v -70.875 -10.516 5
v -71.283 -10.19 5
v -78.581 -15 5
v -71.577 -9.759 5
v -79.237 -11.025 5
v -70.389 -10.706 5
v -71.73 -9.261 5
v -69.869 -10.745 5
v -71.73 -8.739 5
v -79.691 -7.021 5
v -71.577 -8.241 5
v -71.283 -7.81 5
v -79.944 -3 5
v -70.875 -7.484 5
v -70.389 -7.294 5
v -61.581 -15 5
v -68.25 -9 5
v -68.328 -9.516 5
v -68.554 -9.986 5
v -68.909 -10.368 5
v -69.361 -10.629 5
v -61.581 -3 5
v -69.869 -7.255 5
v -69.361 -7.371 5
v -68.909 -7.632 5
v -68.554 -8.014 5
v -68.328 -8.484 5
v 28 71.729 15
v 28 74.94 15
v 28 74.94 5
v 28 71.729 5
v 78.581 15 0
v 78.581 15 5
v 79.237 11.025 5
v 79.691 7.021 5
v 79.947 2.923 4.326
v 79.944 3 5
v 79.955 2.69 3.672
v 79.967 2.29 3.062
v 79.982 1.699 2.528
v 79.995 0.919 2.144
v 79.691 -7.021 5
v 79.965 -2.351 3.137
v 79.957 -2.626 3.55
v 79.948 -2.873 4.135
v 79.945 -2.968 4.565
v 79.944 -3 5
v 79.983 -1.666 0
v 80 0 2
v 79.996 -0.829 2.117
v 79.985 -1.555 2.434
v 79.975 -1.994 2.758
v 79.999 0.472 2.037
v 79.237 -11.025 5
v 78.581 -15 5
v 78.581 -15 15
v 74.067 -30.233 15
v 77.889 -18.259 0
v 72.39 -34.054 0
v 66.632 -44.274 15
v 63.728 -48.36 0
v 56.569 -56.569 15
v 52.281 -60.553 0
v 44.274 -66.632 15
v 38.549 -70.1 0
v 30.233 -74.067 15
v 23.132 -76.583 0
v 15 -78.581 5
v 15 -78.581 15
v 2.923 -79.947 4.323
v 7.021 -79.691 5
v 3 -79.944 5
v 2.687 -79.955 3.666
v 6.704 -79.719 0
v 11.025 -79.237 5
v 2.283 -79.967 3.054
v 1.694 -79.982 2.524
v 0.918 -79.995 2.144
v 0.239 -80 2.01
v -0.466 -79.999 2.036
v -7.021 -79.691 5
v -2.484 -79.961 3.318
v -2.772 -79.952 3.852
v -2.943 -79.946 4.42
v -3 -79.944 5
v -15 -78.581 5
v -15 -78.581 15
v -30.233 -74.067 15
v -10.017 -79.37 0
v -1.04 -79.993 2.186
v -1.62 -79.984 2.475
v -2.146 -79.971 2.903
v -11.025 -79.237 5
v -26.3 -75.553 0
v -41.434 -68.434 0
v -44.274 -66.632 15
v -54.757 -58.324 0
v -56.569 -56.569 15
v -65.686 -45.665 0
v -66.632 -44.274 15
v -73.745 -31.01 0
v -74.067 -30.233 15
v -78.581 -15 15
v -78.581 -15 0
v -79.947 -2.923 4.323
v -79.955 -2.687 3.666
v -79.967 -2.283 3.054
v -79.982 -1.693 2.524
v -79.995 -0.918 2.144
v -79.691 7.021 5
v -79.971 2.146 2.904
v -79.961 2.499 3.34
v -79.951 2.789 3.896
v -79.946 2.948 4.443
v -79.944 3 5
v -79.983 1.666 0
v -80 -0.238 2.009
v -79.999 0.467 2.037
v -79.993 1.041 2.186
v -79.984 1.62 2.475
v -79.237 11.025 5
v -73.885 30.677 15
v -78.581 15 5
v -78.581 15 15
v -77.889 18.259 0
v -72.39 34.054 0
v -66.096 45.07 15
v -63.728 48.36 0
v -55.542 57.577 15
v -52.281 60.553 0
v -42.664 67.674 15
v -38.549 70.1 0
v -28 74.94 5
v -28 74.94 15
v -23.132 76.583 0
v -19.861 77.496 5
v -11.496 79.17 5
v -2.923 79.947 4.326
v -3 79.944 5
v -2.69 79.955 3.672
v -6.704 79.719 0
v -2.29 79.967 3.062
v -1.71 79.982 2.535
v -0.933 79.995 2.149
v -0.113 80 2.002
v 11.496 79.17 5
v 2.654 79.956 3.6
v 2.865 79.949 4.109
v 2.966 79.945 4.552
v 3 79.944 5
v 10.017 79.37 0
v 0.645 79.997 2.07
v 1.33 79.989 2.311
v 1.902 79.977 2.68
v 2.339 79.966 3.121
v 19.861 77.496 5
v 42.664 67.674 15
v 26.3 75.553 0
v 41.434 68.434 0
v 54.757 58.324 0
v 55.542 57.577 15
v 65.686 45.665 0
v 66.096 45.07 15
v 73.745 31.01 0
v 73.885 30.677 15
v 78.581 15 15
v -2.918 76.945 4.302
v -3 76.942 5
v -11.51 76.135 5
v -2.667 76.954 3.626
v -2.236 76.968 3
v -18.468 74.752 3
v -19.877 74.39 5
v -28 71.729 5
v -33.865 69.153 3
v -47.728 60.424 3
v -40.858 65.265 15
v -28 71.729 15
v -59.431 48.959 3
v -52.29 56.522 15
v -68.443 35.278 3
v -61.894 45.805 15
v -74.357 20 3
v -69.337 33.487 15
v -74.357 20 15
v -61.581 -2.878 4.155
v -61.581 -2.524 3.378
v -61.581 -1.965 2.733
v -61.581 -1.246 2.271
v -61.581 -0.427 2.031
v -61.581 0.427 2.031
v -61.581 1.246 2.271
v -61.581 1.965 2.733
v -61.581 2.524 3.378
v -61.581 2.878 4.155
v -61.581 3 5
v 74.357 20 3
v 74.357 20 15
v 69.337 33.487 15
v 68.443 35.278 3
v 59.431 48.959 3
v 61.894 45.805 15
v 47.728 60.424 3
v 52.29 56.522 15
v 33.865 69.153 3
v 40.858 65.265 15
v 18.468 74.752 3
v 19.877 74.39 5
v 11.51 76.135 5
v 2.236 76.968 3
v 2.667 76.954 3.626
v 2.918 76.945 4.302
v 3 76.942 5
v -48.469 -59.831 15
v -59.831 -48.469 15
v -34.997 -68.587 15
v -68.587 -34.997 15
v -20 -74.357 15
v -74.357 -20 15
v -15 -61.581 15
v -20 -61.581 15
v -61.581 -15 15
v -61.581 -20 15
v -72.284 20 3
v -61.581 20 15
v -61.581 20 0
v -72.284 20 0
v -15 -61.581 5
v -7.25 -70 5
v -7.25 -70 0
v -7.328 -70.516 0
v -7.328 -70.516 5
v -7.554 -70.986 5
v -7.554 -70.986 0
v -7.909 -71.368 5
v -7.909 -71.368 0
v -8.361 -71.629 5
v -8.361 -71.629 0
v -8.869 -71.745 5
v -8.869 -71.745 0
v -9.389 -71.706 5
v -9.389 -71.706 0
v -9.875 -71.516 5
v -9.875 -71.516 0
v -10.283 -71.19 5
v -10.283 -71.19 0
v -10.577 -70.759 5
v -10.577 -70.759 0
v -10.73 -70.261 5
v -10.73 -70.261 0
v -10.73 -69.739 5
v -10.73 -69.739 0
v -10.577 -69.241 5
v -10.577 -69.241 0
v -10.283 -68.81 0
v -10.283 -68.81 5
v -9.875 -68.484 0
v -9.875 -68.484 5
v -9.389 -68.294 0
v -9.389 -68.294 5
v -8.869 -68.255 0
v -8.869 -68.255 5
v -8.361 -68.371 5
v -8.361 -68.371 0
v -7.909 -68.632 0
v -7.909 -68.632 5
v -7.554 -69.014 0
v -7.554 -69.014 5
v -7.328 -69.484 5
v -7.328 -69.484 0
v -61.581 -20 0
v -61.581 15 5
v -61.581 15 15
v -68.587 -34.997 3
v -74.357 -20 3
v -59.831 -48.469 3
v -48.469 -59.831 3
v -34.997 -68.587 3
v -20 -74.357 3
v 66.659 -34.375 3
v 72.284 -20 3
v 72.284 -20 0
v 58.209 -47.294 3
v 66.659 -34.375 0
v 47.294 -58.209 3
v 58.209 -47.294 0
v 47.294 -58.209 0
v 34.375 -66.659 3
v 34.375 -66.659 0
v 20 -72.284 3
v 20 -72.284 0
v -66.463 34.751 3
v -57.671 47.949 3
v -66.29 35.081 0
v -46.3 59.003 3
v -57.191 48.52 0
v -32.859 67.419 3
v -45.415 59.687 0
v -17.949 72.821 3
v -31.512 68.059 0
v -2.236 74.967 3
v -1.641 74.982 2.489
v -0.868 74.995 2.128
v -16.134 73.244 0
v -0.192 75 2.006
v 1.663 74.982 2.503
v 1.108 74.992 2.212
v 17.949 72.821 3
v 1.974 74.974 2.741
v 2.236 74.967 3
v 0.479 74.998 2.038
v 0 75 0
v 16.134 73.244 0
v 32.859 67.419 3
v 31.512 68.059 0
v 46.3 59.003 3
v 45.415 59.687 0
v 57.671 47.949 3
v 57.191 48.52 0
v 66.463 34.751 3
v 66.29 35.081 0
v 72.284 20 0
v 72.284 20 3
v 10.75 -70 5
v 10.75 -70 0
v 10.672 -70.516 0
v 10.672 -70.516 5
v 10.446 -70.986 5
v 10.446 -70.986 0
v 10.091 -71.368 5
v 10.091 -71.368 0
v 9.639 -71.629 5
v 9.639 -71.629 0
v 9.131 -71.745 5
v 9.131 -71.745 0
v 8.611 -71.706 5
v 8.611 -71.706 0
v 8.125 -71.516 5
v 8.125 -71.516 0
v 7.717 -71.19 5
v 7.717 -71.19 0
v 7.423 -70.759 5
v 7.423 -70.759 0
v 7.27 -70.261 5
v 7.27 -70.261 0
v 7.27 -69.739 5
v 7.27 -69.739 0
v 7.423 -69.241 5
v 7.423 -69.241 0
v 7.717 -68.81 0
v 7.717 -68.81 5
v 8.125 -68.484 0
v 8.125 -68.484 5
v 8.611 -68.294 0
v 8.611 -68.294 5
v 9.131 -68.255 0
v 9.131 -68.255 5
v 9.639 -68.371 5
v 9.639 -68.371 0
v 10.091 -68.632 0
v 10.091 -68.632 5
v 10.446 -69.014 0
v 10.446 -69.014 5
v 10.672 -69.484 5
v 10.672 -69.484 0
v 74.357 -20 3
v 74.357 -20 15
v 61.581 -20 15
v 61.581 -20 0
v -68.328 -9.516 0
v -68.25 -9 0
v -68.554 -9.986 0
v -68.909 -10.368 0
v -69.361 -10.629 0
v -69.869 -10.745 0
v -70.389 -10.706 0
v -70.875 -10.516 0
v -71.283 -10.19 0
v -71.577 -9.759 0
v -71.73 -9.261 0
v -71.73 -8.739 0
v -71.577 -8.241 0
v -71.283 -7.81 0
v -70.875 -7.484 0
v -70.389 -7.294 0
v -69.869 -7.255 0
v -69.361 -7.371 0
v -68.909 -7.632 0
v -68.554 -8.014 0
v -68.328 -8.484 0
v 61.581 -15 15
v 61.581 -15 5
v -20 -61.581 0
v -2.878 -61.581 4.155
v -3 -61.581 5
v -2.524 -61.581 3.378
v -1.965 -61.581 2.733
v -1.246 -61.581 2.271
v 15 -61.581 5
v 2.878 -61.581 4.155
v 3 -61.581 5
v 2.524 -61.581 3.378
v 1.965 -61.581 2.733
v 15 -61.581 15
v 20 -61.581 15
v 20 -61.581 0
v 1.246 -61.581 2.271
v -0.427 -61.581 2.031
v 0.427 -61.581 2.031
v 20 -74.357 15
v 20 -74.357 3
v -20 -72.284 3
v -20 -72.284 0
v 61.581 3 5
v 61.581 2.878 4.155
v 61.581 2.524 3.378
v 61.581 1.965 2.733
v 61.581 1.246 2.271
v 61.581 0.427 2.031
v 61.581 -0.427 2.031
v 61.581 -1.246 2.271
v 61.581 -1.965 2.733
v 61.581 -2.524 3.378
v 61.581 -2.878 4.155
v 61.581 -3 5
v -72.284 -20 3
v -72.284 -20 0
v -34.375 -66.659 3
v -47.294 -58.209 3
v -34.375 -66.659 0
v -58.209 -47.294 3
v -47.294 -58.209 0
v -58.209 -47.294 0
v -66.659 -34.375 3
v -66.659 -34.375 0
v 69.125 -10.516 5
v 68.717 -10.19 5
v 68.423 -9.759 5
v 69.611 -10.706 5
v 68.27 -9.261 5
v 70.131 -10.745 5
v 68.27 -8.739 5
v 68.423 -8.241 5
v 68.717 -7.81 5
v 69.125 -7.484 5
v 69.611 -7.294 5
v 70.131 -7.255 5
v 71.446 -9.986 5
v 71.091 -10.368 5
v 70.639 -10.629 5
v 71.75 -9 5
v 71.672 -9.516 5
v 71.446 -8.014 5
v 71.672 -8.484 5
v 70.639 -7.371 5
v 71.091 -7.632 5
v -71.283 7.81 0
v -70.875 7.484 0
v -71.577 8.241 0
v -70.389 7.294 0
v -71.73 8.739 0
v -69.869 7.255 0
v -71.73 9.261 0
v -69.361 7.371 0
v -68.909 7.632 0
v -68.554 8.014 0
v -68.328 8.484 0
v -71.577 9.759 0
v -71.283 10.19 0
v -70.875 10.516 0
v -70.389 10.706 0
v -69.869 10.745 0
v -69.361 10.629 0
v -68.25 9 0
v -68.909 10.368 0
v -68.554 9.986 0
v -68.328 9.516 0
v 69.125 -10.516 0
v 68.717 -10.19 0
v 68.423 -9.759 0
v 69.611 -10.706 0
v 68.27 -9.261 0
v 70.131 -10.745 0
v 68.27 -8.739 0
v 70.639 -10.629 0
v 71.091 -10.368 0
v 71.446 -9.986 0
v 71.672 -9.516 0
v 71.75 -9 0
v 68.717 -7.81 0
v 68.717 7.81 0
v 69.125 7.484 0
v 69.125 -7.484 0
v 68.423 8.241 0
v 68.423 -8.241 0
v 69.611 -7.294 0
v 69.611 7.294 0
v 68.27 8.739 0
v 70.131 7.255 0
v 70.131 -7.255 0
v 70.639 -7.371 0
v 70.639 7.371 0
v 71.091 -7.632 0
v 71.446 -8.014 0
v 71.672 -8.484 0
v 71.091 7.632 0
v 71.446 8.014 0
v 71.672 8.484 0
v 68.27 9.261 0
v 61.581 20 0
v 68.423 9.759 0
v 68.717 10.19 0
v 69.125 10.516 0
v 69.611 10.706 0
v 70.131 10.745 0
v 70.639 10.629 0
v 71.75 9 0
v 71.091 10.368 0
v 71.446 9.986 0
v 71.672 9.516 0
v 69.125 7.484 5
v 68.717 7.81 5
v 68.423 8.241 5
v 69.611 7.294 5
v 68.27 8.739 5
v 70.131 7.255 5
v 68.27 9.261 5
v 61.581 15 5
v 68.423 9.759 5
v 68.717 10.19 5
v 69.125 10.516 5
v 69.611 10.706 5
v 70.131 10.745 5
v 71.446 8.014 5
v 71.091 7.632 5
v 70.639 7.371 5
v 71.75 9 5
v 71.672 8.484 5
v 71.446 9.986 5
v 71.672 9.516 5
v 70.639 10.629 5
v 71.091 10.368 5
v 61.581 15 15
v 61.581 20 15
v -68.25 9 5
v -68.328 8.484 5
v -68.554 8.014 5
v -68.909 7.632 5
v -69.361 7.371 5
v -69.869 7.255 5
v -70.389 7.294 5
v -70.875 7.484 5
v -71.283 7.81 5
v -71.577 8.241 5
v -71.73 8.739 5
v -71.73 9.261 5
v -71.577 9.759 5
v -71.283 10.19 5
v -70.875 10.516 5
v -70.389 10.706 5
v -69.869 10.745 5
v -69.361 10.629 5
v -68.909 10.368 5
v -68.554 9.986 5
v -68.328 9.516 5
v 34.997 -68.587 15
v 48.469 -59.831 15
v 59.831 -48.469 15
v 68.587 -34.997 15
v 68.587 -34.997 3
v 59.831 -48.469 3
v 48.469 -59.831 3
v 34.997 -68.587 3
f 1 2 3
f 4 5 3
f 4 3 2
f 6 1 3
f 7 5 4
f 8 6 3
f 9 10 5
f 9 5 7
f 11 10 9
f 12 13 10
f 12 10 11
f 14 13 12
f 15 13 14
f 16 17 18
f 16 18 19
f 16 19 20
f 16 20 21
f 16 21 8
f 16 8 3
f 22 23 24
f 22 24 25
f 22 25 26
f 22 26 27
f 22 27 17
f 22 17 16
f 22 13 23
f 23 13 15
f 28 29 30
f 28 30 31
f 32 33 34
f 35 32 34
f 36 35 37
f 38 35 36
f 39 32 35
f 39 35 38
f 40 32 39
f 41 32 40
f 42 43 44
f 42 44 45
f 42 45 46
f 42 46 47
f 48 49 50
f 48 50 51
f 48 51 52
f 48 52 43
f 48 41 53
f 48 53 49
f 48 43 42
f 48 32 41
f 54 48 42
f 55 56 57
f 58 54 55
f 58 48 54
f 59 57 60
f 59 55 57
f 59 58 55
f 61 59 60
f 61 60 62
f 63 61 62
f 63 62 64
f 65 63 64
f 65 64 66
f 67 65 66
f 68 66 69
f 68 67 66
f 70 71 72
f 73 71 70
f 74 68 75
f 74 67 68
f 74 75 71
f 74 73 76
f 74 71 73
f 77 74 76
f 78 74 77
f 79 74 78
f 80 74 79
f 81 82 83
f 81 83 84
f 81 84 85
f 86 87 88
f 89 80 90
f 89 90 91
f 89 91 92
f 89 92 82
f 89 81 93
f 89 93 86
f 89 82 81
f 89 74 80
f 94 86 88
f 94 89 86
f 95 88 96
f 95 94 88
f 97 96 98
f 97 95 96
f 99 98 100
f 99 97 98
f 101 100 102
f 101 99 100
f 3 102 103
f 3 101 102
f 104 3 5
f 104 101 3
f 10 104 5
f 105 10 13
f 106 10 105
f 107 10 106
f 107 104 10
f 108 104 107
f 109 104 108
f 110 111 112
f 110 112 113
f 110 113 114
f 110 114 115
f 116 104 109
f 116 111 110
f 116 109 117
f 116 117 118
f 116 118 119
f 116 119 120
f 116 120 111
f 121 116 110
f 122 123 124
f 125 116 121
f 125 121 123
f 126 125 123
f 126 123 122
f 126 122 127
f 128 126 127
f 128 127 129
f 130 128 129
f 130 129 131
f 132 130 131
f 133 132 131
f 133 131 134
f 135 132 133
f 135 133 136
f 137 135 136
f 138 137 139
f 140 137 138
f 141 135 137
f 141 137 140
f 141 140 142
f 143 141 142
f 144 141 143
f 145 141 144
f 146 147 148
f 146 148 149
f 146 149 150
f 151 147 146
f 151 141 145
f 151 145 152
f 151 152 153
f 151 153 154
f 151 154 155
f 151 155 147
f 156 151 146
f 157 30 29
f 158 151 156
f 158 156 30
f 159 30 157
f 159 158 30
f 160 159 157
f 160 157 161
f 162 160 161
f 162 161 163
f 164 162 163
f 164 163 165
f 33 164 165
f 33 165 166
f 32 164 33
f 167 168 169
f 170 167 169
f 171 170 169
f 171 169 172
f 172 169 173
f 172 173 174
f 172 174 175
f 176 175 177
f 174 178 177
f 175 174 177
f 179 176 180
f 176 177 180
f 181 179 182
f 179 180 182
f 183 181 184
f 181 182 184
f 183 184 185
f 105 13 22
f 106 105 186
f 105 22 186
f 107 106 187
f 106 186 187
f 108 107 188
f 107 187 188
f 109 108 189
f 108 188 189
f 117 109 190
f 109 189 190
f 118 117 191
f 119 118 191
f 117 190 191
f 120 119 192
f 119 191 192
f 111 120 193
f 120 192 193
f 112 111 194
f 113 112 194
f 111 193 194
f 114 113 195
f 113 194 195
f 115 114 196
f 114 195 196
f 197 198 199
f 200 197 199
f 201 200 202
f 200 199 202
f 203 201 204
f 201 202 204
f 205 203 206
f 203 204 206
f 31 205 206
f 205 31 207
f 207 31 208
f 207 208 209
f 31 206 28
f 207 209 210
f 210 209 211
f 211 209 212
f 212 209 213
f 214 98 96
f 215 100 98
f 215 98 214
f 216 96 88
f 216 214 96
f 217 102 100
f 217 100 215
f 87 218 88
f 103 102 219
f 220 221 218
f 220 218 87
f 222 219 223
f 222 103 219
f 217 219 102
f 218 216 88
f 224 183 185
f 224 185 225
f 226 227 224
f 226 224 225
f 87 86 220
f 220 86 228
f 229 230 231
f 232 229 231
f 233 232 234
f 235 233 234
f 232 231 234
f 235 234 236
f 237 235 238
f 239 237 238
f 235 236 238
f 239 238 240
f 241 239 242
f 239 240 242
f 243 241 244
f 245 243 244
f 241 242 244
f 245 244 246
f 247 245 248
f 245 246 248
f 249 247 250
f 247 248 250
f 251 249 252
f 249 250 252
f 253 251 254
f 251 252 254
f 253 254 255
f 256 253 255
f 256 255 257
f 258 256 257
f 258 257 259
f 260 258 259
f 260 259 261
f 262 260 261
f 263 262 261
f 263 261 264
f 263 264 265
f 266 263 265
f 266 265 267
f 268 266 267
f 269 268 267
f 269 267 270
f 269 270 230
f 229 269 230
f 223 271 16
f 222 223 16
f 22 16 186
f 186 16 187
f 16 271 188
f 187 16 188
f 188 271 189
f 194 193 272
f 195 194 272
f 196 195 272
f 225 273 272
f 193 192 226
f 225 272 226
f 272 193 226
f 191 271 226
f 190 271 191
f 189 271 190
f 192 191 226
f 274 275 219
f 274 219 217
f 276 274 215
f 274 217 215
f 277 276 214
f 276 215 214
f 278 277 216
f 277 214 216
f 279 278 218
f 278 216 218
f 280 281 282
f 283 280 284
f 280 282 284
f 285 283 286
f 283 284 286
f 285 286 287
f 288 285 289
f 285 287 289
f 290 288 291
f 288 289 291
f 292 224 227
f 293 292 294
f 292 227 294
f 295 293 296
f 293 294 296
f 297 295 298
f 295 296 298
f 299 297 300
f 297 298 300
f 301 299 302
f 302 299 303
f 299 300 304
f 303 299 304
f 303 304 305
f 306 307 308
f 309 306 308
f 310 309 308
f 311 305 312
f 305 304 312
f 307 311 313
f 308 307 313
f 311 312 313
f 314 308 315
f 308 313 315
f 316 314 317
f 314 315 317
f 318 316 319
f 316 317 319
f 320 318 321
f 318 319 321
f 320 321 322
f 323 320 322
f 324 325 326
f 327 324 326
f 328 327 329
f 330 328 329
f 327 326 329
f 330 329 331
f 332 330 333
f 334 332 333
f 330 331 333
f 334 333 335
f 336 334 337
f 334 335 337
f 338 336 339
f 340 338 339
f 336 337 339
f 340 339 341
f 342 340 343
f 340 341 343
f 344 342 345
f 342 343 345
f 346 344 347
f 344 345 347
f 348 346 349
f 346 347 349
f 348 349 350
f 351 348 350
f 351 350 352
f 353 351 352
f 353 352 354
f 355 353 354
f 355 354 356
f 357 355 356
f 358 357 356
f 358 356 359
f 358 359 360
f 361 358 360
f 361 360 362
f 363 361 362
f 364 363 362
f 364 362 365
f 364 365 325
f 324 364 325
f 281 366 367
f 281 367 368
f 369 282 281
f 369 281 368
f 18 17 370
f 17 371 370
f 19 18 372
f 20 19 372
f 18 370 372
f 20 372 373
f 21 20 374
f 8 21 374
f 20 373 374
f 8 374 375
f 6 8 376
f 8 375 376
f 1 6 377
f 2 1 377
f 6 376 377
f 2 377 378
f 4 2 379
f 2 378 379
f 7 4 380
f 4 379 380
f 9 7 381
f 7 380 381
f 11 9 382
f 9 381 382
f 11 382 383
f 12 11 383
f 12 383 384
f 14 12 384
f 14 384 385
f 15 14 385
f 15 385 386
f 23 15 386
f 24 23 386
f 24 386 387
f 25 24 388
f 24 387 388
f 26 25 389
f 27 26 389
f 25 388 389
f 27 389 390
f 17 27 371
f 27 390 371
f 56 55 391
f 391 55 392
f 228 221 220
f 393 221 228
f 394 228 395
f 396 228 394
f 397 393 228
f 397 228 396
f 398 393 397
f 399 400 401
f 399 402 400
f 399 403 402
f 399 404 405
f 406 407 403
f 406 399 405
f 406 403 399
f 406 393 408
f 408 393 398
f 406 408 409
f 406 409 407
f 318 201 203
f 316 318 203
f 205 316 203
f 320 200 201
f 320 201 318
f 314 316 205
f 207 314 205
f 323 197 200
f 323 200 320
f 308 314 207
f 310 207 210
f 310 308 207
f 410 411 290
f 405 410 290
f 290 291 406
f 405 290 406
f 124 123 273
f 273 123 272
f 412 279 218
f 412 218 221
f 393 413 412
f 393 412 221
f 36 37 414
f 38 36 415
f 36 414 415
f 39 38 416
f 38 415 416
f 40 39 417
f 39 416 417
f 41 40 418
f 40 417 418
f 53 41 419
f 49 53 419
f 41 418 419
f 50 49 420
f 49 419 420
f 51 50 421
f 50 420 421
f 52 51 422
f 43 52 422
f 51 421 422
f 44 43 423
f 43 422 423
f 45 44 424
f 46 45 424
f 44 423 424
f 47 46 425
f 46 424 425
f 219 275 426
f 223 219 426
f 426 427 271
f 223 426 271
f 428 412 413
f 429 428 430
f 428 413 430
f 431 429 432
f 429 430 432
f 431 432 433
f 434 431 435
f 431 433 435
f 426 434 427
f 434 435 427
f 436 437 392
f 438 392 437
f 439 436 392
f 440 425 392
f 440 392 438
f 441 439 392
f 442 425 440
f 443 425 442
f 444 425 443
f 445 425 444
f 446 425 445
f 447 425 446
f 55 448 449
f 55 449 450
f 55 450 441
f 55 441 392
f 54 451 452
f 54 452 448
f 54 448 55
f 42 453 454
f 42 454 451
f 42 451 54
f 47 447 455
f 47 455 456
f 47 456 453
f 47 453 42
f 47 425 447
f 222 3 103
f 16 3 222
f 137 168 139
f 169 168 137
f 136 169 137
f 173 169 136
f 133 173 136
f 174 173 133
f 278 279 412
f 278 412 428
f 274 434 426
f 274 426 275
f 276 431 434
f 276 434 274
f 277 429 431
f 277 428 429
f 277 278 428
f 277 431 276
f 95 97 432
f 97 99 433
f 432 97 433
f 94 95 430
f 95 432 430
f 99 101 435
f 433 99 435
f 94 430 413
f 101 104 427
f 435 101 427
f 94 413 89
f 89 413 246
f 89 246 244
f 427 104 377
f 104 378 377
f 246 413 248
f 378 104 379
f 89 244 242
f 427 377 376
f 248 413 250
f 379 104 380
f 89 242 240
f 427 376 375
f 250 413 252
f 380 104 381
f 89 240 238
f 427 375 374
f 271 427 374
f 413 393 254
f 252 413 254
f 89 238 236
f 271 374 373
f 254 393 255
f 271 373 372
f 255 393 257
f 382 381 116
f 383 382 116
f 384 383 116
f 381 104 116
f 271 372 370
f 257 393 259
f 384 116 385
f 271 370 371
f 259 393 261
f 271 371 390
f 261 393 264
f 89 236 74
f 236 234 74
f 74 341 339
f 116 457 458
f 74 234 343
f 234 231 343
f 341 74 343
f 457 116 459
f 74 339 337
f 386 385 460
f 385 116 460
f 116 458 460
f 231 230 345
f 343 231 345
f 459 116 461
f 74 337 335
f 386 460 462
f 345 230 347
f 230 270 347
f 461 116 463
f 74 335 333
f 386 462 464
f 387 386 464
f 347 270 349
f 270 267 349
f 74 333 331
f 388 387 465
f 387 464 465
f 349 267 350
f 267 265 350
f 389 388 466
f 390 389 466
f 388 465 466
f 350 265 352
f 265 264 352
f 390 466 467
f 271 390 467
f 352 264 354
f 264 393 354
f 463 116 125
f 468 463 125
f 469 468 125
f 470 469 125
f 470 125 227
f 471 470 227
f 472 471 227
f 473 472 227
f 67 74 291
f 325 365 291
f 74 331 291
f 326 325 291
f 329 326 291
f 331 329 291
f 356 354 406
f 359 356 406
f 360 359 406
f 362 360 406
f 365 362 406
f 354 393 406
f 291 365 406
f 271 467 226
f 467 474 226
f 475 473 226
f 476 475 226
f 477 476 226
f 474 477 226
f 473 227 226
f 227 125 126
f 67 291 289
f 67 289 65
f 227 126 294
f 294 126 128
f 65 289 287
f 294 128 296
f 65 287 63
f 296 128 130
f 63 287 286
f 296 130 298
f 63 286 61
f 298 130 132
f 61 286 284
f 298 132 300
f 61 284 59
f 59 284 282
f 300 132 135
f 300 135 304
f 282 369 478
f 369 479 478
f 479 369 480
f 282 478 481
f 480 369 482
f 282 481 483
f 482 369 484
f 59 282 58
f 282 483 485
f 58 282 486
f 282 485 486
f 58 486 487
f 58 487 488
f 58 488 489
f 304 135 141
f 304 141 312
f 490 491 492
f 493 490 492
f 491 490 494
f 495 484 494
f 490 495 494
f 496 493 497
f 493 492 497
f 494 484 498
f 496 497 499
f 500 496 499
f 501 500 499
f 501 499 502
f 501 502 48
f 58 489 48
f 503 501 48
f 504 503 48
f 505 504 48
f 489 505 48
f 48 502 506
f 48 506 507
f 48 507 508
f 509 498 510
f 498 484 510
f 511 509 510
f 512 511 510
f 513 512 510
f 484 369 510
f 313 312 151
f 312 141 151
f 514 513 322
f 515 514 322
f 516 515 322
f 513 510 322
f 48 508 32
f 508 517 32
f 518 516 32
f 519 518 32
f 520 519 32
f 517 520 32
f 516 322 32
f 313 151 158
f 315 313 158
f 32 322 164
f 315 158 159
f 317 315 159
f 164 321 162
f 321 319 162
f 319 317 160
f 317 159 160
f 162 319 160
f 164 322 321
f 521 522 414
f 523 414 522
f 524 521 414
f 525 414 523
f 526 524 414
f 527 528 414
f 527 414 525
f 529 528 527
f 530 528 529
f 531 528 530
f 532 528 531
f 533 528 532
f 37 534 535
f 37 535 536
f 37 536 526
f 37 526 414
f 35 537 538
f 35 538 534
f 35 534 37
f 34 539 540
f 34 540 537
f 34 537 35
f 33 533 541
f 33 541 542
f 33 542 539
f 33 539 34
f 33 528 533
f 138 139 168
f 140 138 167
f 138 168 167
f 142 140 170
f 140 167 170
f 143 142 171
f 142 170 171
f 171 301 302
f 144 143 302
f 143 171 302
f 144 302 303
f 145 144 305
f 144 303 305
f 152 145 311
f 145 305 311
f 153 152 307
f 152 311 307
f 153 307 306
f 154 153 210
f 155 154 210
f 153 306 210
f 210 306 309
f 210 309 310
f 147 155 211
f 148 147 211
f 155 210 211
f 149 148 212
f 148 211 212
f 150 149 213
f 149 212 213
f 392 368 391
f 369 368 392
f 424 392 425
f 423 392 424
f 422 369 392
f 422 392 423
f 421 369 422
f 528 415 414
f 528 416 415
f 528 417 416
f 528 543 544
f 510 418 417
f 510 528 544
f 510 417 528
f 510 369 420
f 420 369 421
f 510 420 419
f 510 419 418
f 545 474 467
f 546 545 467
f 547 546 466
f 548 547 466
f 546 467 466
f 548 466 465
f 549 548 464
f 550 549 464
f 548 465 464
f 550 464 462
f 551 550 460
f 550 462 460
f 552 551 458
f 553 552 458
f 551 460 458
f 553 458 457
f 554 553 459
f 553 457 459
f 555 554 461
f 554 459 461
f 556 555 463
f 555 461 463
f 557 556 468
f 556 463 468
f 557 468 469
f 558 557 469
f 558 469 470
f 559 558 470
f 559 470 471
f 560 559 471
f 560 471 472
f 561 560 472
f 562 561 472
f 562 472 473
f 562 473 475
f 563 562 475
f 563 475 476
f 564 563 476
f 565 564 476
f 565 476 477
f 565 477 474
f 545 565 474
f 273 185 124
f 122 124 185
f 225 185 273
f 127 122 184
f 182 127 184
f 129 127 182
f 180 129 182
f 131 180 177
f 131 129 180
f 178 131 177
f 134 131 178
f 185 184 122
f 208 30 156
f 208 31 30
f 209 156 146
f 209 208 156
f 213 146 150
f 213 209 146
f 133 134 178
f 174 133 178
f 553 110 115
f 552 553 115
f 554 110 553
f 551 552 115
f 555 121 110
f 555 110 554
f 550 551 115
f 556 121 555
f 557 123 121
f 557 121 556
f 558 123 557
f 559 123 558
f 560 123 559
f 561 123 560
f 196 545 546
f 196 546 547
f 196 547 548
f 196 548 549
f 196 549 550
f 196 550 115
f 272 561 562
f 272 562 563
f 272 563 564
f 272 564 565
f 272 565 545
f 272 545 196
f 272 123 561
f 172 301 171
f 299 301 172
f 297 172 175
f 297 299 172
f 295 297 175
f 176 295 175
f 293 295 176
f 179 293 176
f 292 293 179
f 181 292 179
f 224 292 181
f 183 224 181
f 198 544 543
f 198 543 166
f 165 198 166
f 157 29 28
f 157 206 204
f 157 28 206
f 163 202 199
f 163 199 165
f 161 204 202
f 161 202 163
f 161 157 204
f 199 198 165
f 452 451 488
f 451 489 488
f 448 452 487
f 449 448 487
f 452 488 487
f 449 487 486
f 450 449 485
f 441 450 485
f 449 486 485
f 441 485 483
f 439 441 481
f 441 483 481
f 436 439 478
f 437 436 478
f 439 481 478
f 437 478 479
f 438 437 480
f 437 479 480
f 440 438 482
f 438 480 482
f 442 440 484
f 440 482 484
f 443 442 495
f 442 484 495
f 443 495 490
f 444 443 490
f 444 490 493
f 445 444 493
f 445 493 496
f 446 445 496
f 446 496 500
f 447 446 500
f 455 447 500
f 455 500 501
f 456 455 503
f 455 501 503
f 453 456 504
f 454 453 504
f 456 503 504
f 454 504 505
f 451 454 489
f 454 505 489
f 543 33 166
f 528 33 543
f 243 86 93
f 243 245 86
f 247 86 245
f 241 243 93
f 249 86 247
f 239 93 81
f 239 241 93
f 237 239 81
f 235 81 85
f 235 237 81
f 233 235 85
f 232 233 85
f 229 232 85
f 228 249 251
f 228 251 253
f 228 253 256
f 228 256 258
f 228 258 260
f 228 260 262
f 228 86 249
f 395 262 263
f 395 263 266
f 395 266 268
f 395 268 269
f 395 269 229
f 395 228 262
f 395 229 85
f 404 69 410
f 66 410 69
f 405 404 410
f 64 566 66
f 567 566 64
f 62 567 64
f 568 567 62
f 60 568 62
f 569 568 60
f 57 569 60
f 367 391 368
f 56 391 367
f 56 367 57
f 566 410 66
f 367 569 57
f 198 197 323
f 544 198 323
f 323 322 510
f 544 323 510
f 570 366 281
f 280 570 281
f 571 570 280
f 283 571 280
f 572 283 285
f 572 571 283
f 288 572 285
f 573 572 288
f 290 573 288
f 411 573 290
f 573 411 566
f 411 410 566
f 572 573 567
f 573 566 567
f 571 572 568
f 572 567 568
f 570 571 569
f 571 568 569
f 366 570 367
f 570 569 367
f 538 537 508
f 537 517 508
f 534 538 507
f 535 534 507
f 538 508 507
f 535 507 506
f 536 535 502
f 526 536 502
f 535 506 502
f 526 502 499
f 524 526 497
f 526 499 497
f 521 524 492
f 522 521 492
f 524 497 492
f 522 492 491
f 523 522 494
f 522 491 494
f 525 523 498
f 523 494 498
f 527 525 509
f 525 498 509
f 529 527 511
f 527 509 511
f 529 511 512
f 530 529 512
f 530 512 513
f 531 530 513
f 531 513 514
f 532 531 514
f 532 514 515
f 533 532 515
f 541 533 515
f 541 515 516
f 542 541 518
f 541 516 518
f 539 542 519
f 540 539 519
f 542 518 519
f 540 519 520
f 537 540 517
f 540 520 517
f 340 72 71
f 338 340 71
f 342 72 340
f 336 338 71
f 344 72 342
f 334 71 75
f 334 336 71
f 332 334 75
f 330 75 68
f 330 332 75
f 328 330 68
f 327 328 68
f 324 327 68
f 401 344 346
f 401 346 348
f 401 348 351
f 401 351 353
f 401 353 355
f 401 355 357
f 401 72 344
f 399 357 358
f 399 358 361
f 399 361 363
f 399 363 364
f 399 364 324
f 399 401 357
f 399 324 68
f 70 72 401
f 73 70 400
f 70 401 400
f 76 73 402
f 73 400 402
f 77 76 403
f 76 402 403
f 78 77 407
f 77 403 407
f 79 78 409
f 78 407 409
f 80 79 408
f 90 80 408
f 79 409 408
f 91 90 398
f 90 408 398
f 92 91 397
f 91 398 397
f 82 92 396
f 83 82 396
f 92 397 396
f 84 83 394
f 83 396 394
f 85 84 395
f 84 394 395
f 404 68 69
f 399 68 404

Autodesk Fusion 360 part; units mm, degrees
sketch "Sketch1" plane through (0, 0, 0) normal (0, 0, 1) x (1, 0, 0)
  circle A0 centre (0, 0) radius 80
  circle A1 centre (0, 0) radius 75
  line L0 (109.3577, 15) -> (-93.0881, 15) construction
  line L1 (20, 0) -> (2.5, 0)
  line L2 (109.3577, -15) -> (-93.0881, -15) construction
  line L3 (-78.5812, 15) -> (-61.5812, 15)
  line L4 (-78.5812, -15) -> (-61.5812, -15)
  line L5 (-97.5254, 20) -> (90.0497, 20) construction
  line L6 (-97.5254, -20) -> (90.0497, -20) construction
  line L7 (-77.4597, 20) -> (-61.5812, 20)
  line L8 (-77.4597, -20) -> (-61.5812, -20)
  line L9 (-61.5812, -15) -> (-61.5812, -20)
  line L10 (-61.5812, 15) -> (-61.5812, 20)
  line L11 (-20, -77.4597) -> (-20, -61.5812)
  line L12 (-15, -61.5812) -> (-20, -61.5812)
  line L13 (-15, -78.5812) -> (-15, -61.5812)
  line L14 (15, -78.5812) -> (15, -61.5812)
  line L15 (15, -61.5812) -> (20, -61.5812)
  line L16 (20, -77.4597) -> (20, -61.5812)
  line L17 (77.4597, -20) -> (61.5812, -20)
  line L18 (61.5812, -15) -> (61.5812, -20)
  line L19 (78.5812, -15) -> (61.5812, -15)
  line L20 (78.5812, 15) -> (61.5812, 15)
  line L21 (61.5812, 15) -> (61.5812, 20)
  line L22 (77.4597, 20) -> (61.5812, 20)
  line L23 (-28, 82.3691) -> (-28, 36.8916) construction
  line L24 (0, 2.5) -> (0, 20)
  line L25 (28, 82.3691) -> (28, 36.8916) construction
  line L26 (-33, 78.0405) -> (-33, 48.5416) construction
  line L27 (33, 78.0405) -> (33, 48.5416) construction
  line L28 (-28, 74.94) -> (-28, 69.5773)
  line L29 (28, 74.94) -> (28, 69.5773)
  line L30 (-61.5812, 15) -> (-61.5812, -15)
  line L31 (-15, -61.5812) -> (15, -61.5812)
  line L32 (61.5812, -15) -> (61.5812, 15)
  circle A2 centre (0, 0) radius 77
  dimension "d1" = 160
  dimension "d2" = -5
  dimension "d3" = 15
  dimension "d4" = 17
  dimension "d5" = 17
  dimension "d6" = 20
  dimension "d8" = 360
  dimension "d9" = 28
  dimension "d10" = 33
  dimension "d13" = -3
extrude "Extrude1" add sketch "Sketch1" along normal blind 15 contours A0 L20 L22 A2 | A0 L17 L19 A2 | A0 L22 L29 A2 | A1 L20 L22 A2 | A0 L16 L17 A2 | A1 L17 L19 A2 | A0 L28 L29 A2 | A1 L22 L29 A2 | A1 L20 L21 L22 | A0 L14 L16 A2 | A1 L16 L17 A2 | A1 L17 L18 L19 | A0 L7 L28 A2 | A1 L28 L29 A2 | A1 L14 L16 A2 | A0 L3 L7 A2 | A1 L7 L28 A2 | A0 L11 L13 A2 | A1 L14 L15 L16 | A1 L3 L7 A2 | A0 L8 L11 A2 | A1 L11 L13 A2 | A0 L4 L8 A2 | A1 L3 L7 L10 | A1 L8 L11 A2 | A1 L11 L12 L13 | A1 L4 L8 A2 | A1 L4 L8 L9 makes body 1 at (-69.1013, 40.3114, 10) makes body 2 at (18.8878, -77.7383, 5) makes body 3 at (-77.7383, -18.8878, 5)
extrude "Extrude2" add sketch "Sketch1" along normal blind 5 contours A0 L19 L20 A2 | A0 L20 L22 A2 | A0 L17 L19 A2 | A1 L19 L20 A2 | A1 L20 L22 A2 | A1 L17 L19 A2 | A1 L20 L21 L22 | A1 L19 L20 L32 | A0 L14 L16 A2 | A1 L17 L18 L19 | A0 L13 L14 A2 | A1 L14 L16 A2 | A0 L3 L7 A2 | A0 L11 L13 A2 | A1 L13 L14 A2 | A1 L14 L15 L16 | A0 L3 L4 A2 | A1 L3 L7 A2 | A1 L11 L13 A2 | A1 L13 L14 L31 | A0 L4 L8 A2 | A1 L3 L4 A2 | A1 L3 L7 L10 | A1 L11 L12 L13 | A1 L4 L8 A2 | A1 L3 L4 L30 | A1 L4 L8 L9 bodies 1 2 3
sketch "Sketch2" plane through (0, 0, 15) normal (0, 0, 1) x (-1, 0, 0)
  arc A0 (78.5812, 15) -> (15, 78.5812) centre (0, 0) ccw
  line L0 (15, 78.5812) -> (15, 61.5812)
  line L1 (15, 61.5812) -> (20, 61.5812)
  line L2 (20, 61.5812) -> (20, 72.2842)
  arc A1 (72.2842, 20) -> (20, 72.2842) centre (0, 0) ccw
  line L3 (72.2842, 20) -> (61.5812, 20)
  line L4 (61.5812, 20) -> (61.5812, 15)
  line L5 (61.5812, 15) -> (78.5812, 15)
  circle A2 centre (0, 0) radius 80
  circle A3 centre (0, 0) radius 77
  circle A4 centre (0, 0) radius 75
  line L6 (97.5254, 20) -> (-90.0497, 20)
  line L7 (97.5254, -20) -> (-90.0497, -20)
  line L8 (-20, 77.4597) -> (-20, 61.5812)
  line L9 (20, 77.4597) -> (20, 61.5812)
  line L10 (20, 72.2842) -> (20, 77.4597)
  line L11 (-20, 72.2842) -> (-20, 77.4597)
  line L12 (-72.2842, 20) -> (-77.4597, 20)
  line L13 (-72.2842, -20) -> (-77.4597, -20)
  line L14 (77.4597, 20) -> (72.2842, 20)
  line L15 (77.4597, -20) -> (72.2842, -20)
  dimension "d16" = -3
  dimension "d17" = -5
  dimension "d18" = 160
extrude "Extrude3" cut sketch "Sketch2" against normal blind 12 contours A1 A3 A4 L6 L9 L10 L14 | A3 A4 L7 L13 L15 | A3 A4 L6 L8 L11 L12 bodies 1
sketch "Sketch3" plane through (0, 0, 0) normal (0, 0, -1) x (1, 0, 0)
  arc A0 (-20, 72.2842) -> (-72.2842, 20) centre (0, 0) ccw
  line L0 (-20, 72.2842) -> (-20, 61.5812)
  line L1 (-20, 61.5812) -> (20, 61.5812)
  line L2 (20, 61.5812) -> (20, 72.2842)
  arc A1 (72.2842, 20) -> (20, 72.2842) centre (0, 0) ccw
  line L3 (72.2842, 20) -> (61.5812, 20)
  line L4 (61.5812, 20) -> (61.5812, -20)
  line L5 (61.5812, -20) -> (72.2842, -20)
  arc A2 (-72.2842, -20) -> (72.2842, -20) centre (0, 0) ccw
  line L6 (-72.2842, -20) -> (-61.5812, -20)
  line L7 (-61.5812, -20) -> (-61.5812, 20)
  line L8 (-61.5812, 20) -> (-72.2842, 20)
  circle A3 centre (0, 0) radius 70 construction
  line L9 (-17, 70) -> (15.5974, 70) construction
  circle A4 centre (9, 70) radius 1.75
  circle A5 centre (-9, 70) radius 1.75
  circle A6 centre (-70, 9) radius 1.75
  circle A7 centre (-70, -9) radius 1.75
  circle A8 centre (70, -9) radius 1.75
  circle A9 centre (70, 9) radius 1.75
  circle A10 centre (0, 0) radius 80
  dimension "d21" = 140
  dimension "d22" = 3.5
  dimension "d23" = 3.5
  dimension "d24" = 9
  dimension "d25" = 9
  dimension "d27" = 360
extrude "Extrude4" cut sketch "Sketch3" against normal blind 5 contours A4 | A5 | A6 | A7 | A8 | A9 bodies 1
sketch "Sketch4" plane through (0, 0, 15) normal (0, 0, 1) x (-1, 0, 0)
  line L0 (61.5812, -20) -> (74.3572, -20)
  arc A0 (-74.3572, -20) -> (74.3572, -20) centre (0, 0) ccw
  line L1 (-74.3572, -20) -> (-61.5812, -20)
  line L2 (-61.5812, -20) -> (-61.5812, -15)
  line L3 (-61.5812, -15) -> (-78.5812, -15)
  arc A1 (-78.5812, -15) -> (78.5812, -15) centre (0, 0) ccw
  line L4 (78.5812, -15) -> (61.5812, -15)
  line L5 (61.5812, -15) -> (61.5812, -20)
  line L6 (28, -82.3691) -> (28, -36.8916)
  line L7 (-28, -82.3691) -> (-28, -36.8916)
  circle A2 centre (0, 0) radius 75
  circle A3 centre (0, 0) radius 80
  line L8 (28, -74.94) -> (28, -69.5773)
  line L9 (-28, -74.94) -> (-28, -69.5773)
extrude "Extrude5" cut sketch "Sketch4" against normal blind 10 contours A0 L6 L7 A2 L8 L9 | A0 A1 L6 L7 A3 L8 L9 bodies 1
sketch "Sketch5" plane through (0, -61.5812, 0) normal (0, 1, 0) x (-1, 0, 0)
  line L0 (-15, 5) -> (-15, 15)
  line L1 (-15, 15) -> (-20, 15)
  line L2 (-20, 15) -> (-20, 0)
  line L3 (-20, 0) -> (20, 0)
  line L4 (20, 0) -> (20, 15)
  line L5 (20, 15) -> (15, 15)
  line L6 (15, 15) -> (15, 5)
  line L7 (15, 5) -> (-15, 5)
  circle A0 centre (0, 5) radius 3
  dimension "d32" = 6
extrude "Extrude6" cut sketch "Sketch5" against normal blind 18.419 contours L7 A0 picked at (-0.7219, 4.1708) bodies 1
pattern_circular "C-Pattern1" count 4 over 360 about axis through (0, 0, 1.75) along (0, 0, 1) of "Extrude6"
